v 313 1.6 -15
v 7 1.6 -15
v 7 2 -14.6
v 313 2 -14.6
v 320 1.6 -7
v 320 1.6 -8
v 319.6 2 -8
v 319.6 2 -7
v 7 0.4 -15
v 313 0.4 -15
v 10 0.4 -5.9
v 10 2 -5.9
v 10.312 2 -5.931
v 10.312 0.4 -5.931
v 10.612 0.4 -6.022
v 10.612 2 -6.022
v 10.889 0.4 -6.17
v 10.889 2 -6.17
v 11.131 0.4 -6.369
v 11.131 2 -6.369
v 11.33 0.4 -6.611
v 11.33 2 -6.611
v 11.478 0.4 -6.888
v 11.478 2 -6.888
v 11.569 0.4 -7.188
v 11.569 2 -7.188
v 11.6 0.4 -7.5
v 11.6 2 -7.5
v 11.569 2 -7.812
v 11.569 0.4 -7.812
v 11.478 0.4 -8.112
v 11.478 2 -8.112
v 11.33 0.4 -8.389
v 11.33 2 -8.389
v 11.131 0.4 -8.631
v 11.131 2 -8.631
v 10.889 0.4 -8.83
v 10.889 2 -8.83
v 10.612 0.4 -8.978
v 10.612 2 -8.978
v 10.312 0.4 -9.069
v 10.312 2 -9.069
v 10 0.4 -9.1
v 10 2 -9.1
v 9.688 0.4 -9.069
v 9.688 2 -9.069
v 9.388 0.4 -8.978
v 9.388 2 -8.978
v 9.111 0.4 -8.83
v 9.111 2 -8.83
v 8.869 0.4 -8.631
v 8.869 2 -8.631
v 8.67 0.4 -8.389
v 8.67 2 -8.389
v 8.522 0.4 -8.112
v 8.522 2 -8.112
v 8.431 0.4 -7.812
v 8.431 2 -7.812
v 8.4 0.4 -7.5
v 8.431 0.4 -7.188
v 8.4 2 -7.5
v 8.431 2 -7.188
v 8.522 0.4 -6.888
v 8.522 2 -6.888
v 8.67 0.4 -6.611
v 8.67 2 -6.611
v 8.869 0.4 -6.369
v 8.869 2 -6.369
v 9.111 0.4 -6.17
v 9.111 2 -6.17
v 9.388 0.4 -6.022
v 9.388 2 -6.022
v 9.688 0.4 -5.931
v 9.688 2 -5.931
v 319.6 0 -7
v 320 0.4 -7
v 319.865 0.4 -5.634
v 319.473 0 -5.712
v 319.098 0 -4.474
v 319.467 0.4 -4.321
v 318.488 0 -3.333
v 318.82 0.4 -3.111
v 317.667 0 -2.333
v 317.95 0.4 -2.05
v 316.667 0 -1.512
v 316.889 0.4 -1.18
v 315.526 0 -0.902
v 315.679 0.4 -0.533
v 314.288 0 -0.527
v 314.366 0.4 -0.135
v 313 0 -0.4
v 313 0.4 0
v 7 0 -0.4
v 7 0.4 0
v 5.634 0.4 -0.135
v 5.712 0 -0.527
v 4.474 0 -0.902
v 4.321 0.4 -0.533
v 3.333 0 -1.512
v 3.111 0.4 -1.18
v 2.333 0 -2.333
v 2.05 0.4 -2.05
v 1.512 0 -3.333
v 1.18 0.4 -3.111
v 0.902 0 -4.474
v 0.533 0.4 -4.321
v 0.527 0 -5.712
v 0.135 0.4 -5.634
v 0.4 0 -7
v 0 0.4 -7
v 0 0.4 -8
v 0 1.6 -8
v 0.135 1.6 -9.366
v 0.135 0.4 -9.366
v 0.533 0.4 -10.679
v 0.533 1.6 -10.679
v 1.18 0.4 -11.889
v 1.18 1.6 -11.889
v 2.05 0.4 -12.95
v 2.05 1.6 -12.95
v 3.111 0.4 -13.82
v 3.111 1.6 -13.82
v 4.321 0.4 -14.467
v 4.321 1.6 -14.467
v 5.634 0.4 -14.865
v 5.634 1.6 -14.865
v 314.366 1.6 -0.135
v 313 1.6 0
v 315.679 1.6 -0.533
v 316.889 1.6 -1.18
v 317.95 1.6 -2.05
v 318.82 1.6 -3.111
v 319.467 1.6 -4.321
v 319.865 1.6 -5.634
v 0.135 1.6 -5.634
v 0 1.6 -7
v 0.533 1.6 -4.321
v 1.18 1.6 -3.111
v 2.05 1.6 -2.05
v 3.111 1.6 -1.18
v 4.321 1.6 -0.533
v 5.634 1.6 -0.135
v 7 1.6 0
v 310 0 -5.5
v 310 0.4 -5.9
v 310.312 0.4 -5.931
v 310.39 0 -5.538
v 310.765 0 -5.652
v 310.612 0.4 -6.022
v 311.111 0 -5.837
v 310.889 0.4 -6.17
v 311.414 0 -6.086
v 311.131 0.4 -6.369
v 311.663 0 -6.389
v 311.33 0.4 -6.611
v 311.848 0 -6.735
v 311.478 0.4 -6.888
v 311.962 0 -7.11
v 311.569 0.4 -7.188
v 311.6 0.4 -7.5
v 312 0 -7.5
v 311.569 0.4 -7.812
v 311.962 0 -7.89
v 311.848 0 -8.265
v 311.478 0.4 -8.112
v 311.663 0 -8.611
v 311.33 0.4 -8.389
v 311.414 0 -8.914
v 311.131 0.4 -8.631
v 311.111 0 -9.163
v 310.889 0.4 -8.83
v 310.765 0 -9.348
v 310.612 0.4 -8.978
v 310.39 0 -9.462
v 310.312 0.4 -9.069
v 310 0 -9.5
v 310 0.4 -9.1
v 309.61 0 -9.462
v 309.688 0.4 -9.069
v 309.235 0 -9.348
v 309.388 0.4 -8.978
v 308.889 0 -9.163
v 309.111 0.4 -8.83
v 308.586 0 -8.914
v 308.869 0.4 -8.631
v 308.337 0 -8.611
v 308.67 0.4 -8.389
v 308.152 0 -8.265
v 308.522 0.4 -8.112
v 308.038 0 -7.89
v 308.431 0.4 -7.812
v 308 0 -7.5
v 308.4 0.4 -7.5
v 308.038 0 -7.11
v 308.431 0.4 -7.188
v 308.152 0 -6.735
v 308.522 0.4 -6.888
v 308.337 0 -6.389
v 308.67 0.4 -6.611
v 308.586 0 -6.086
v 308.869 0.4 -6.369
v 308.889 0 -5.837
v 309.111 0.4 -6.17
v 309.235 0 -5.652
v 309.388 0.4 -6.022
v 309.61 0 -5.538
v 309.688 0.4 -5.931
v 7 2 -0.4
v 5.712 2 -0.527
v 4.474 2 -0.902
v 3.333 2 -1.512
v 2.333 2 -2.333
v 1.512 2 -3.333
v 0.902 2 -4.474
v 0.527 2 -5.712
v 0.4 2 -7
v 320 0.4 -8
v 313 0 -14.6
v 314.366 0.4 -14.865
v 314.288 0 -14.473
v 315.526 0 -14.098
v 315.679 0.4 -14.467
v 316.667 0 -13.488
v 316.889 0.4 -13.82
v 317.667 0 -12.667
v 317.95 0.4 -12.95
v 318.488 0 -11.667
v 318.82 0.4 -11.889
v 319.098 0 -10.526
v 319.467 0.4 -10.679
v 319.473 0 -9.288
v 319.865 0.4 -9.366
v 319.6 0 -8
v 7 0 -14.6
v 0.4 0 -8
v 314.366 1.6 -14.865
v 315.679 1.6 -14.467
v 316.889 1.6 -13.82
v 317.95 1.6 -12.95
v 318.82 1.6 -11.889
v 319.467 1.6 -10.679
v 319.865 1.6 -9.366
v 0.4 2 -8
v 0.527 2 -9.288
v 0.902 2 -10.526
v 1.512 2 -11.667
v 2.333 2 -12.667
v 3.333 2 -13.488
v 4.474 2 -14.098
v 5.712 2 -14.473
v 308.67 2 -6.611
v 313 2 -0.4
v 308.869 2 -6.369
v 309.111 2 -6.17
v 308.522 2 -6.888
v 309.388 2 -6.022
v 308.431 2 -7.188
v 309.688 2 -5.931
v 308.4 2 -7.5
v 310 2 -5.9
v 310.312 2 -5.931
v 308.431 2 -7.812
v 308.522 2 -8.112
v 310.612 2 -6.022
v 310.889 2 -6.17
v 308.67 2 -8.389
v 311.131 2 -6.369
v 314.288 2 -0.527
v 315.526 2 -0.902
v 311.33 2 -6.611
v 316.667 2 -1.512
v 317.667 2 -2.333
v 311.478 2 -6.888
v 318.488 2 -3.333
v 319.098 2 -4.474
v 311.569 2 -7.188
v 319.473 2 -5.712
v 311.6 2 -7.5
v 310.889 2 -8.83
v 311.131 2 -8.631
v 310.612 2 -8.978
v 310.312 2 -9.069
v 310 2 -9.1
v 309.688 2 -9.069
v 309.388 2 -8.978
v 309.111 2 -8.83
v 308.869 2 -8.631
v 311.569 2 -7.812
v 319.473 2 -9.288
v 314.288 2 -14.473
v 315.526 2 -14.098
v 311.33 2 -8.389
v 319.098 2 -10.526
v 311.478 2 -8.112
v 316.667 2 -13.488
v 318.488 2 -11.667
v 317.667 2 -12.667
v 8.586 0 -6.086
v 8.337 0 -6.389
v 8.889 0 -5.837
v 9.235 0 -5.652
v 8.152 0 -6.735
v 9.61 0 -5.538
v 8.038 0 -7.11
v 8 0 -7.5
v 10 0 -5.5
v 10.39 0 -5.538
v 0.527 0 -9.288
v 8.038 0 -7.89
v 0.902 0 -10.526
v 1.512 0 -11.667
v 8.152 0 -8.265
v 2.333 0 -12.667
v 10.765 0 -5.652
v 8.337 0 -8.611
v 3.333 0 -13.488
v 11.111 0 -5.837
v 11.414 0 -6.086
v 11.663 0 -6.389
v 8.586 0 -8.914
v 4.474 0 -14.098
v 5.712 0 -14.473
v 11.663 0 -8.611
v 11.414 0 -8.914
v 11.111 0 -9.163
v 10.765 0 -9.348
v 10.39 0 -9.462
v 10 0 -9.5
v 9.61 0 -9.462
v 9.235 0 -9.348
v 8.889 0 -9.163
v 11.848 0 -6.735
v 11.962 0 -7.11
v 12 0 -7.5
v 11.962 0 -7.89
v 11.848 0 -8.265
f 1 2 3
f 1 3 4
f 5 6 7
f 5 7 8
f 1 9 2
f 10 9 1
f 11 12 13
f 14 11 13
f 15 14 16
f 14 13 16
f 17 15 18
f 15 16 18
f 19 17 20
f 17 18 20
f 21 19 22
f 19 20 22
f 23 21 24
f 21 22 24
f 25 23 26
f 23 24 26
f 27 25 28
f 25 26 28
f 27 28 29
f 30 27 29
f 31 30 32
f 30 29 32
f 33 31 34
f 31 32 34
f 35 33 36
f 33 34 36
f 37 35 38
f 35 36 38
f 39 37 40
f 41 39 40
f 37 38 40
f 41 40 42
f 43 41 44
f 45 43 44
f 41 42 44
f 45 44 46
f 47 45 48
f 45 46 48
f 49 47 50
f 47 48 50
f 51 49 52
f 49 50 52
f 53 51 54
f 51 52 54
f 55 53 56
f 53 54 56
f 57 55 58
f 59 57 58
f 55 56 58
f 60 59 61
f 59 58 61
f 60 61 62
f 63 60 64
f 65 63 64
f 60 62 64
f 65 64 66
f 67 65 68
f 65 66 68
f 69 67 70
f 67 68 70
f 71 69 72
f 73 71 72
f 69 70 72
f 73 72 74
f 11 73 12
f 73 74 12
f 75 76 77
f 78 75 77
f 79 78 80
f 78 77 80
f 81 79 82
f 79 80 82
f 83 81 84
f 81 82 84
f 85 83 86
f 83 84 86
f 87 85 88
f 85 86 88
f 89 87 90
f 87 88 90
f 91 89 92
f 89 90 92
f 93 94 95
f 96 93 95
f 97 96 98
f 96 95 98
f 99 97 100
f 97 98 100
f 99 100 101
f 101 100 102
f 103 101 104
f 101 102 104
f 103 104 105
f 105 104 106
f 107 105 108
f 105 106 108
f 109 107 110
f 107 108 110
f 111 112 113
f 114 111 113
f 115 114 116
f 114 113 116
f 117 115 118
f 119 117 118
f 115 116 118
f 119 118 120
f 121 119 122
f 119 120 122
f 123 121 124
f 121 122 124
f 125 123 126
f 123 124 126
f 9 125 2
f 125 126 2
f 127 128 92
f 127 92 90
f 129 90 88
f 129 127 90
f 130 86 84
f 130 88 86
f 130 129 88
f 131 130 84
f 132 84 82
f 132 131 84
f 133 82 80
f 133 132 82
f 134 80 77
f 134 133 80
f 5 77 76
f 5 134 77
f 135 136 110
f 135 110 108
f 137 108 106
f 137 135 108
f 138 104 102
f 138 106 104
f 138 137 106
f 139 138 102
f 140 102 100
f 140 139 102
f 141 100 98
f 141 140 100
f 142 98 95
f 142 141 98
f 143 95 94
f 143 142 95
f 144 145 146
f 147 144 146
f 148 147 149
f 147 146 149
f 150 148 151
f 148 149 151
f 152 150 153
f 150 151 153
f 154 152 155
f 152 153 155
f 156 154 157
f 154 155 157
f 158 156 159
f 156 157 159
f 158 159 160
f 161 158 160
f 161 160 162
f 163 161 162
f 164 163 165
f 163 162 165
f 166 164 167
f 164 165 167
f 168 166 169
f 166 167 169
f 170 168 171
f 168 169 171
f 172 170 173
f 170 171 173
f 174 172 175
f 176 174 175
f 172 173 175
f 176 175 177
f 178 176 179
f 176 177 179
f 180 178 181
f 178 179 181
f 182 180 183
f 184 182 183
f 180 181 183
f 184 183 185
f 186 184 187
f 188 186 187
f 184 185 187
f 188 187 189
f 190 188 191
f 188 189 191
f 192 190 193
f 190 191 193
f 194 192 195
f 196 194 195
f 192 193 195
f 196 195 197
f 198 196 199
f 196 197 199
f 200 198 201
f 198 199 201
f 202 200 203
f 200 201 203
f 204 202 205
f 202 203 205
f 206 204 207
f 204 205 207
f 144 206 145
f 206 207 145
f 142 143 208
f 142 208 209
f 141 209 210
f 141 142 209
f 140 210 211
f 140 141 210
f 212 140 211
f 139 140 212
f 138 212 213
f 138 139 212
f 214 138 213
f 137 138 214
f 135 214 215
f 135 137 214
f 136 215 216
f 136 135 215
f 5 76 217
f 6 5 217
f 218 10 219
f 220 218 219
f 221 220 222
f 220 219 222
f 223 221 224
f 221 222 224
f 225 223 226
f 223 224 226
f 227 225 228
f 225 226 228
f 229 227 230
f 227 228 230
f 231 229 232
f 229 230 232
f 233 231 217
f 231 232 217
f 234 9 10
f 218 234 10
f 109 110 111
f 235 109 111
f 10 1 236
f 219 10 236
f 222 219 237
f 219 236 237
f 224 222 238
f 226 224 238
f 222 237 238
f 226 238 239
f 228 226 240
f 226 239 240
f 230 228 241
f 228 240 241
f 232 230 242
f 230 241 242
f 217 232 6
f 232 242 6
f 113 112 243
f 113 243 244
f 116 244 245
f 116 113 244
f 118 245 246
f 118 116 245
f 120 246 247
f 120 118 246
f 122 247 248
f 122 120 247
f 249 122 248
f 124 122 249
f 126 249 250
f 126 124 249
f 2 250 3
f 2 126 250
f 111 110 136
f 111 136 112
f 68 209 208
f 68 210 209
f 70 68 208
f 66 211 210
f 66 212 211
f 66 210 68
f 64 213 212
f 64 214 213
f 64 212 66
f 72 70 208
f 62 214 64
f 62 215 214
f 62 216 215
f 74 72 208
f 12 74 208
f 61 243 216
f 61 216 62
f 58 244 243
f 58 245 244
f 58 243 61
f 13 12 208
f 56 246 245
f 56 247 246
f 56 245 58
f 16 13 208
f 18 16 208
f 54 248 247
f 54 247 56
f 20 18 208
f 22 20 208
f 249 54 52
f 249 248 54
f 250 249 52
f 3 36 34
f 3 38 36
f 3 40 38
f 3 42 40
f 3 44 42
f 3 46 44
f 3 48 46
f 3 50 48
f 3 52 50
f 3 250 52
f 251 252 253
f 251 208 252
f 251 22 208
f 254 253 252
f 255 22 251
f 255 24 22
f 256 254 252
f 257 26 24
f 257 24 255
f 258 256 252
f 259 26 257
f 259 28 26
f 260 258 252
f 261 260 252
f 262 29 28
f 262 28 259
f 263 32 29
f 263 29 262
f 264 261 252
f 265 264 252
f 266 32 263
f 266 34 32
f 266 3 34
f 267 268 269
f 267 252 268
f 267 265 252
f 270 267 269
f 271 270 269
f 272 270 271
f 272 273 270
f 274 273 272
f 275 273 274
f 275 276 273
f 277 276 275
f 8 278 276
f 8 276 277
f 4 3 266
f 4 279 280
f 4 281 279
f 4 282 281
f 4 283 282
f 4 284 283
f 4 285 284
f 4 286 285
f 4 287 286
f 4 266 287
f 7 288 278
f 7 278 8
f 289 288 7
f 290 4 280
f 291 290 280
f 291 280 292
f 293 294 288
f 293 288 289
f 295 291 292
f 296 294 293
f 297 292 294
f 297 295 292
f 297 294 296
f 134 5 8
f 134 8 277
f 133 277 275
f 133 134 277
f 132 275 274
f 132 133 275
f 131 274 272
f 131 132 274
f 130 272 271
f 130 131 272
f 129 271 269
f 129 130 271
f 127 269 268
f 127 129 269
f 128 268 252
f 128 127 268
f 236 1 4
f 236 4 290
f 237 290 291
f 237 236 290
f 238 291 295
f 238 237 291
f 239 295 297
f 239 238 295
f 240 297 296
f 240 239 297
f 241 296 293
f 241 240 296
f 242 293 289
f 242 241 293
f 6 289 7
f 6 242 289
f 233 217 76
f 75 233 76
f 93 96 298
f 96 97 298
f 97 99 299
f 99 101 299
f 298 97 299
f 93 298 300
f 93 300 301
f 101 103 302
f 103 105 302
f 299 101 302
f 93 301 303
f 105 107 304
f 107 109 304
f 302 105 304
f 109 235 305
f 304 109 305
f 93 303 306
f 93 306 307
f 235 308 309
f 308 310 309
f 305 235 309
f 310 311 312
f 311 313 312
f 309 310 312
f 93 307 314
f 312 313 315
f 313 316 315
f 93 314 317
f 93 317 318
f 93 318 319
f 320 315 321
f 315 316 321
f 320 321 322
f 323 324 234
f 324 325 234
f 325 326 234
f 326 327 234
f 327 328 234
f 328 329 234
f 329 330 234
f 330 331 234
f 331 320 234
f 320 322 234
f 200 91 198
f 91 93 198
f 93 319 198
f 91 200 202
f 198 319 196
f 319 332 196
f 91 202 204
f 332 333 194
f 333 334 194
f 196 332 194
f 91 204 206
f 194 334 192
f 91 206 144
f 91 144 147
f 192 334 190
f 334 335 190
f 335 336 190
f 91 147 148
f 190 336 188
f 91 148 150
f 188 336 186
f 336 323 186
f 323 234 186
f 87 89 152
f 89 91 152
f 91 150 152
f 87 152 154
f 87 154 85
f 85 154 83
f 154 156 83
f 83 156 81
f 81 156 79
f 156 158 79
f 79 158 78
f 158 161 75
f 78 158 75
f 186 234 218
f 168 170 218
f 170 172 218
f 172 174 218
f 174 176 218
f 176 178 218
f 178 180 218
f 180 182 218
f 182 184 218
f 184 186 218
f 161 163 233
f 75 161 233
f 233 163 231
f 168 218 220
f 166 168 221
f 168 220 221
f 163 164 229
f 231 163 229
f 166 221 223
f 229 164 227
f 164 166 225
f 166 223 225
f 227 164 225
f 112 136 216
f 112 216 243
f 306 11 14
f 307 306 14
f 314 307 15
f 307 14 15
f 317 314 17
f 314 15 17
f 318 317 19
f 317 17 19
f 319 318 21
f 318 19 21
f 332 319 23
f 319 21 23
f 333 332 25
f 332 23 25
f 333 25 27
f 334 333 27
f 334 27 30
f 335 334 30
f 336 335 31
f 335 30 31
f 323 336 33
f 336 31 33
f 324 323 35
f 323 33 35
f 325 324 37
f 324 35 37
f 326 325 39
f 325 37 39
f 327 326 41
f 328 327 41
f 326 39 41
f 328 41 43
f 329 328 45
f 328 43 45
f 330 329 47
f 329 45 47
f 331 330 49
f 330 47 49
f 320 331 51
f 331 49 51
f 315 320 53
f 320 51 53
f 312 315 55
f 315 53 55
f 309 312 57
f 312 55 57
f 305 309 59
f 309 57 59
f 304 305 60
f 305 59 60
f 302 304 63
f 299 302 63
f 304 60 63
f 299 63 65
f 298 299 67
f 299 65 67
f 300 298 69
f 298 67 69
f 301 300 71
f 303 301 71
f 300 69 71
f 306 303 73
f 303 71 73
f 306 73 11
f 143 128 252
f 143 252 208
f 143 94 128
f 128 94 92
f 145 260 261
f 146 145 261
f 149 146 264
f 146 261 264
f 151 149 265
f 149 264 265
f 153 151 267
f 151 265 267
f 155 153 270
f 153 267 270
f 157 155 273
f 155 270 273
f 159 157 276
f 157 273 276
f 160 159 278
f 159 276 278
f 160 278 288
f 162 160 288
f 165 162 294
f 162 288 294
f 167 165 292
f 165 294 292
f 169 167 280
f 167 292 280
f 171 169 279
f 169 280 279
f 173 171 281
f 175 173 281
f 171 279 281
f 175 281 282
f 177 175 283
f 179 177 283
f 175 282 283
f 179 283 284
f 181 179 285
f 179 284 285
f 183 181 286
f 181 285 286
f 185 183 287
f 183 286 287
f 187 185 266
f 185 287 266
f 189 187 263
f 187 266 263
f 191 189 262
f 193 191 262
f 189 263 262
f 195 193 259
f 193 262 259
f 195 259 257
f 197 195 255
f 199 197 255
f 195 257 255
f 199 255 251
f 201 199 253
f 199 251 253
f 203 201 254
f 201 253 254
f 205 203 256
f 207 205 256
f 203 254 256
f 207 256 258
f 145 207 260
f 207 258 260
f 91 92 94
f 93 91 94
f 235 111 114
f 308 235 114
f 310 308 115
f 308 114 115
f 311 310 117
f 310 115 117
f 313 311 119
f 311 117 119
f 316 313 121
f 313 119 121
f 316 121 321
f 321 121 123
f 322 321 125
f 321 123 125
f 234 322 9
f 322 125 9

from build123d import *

# Parameters (mm, degrees)
SKETCH_1_W          = 320
SKETCH_1_H          = 15
EXTRUDE_1_DEPTH     = 2
SKETCH_2_R          = 1.6
CUT_EXTRUDE_1_DEPTH = 2
FILLET_1_R          = 7
CHAMFER_1_SIZE      = 0.4


with BuildPart() as part:
    # 草图1 → 凸台-拉伸1 (new body)
    with BuildSketch(Plane(origin=(0, 0, 0), x_dir=(1, 0, 0), z_dir=(0, 1, 0))):
        with Locations((160, 7.5)):
            Rectangle(SKETCH_1_W, SKETCH_1_H)
    extrude(amount=EXTRUDE_1_DEPTH)

    # 草图2 → 切除-拉伸1 (cut)
    with BuildSketch(Plane(origin=(0, 2, 0), x_dir=(1, 0, 0), z_dir=(0, 1, 0))):
        with Locations(Location((10, 7.5, 0), (0, 0, 270))):
            Circle(SKETCH_2_R)
        with Locations(Location((310, 7.5, 0), (0, 0, 270))):
            Circle(SKETCH_2_R)
    extrude(amount=-CUT_EXTRUDE_1_DEPTH, mode=Mode.SUBTRACT)

    # 圆角1
    fillet_1_edges = [part.edges().sort_by_distance(p)[0] for p in [
        (0, 1, -15),
        (320, 1, -15),
        (320, 1, 0),
        (0, 1, 0),
    ]]
    fillet(fillet_1_edges, radius=FILLET_1_R)

    # 倒角1
    chamfer_1_edges = [part.edges().sort_by_distance(p)[0] for p in [
        (10, 0, -9.1),
        (310, 0, -9.1),
        (160, 0, -15),
        (160, 2, -15),
        (0, 0, -7.5),
        (320, 0, -7.5),
        (160, 0, 0),
        (2.050252532, 0, -12.949747468),
        (2.050252532, 0, -2.050252532),
        (317.949747468, 0, -2.050252532),
        (317.949747468, 0, -12.949747468),
        (320, 2, -7.5),
        (0, 2, -7.5),
        (160, 2, 0),
        (2.050252532, 2, -12.949747468),
        (2.050252532, 2, -2.050252532),
        (317.949747468, 2, -2.050252532),
        (317.949747468, 2, -12.949747468),
    ]]
    chamfer(chamfer_1_edges, length=CHAMFER_1_SIZE)


solid = part.part
